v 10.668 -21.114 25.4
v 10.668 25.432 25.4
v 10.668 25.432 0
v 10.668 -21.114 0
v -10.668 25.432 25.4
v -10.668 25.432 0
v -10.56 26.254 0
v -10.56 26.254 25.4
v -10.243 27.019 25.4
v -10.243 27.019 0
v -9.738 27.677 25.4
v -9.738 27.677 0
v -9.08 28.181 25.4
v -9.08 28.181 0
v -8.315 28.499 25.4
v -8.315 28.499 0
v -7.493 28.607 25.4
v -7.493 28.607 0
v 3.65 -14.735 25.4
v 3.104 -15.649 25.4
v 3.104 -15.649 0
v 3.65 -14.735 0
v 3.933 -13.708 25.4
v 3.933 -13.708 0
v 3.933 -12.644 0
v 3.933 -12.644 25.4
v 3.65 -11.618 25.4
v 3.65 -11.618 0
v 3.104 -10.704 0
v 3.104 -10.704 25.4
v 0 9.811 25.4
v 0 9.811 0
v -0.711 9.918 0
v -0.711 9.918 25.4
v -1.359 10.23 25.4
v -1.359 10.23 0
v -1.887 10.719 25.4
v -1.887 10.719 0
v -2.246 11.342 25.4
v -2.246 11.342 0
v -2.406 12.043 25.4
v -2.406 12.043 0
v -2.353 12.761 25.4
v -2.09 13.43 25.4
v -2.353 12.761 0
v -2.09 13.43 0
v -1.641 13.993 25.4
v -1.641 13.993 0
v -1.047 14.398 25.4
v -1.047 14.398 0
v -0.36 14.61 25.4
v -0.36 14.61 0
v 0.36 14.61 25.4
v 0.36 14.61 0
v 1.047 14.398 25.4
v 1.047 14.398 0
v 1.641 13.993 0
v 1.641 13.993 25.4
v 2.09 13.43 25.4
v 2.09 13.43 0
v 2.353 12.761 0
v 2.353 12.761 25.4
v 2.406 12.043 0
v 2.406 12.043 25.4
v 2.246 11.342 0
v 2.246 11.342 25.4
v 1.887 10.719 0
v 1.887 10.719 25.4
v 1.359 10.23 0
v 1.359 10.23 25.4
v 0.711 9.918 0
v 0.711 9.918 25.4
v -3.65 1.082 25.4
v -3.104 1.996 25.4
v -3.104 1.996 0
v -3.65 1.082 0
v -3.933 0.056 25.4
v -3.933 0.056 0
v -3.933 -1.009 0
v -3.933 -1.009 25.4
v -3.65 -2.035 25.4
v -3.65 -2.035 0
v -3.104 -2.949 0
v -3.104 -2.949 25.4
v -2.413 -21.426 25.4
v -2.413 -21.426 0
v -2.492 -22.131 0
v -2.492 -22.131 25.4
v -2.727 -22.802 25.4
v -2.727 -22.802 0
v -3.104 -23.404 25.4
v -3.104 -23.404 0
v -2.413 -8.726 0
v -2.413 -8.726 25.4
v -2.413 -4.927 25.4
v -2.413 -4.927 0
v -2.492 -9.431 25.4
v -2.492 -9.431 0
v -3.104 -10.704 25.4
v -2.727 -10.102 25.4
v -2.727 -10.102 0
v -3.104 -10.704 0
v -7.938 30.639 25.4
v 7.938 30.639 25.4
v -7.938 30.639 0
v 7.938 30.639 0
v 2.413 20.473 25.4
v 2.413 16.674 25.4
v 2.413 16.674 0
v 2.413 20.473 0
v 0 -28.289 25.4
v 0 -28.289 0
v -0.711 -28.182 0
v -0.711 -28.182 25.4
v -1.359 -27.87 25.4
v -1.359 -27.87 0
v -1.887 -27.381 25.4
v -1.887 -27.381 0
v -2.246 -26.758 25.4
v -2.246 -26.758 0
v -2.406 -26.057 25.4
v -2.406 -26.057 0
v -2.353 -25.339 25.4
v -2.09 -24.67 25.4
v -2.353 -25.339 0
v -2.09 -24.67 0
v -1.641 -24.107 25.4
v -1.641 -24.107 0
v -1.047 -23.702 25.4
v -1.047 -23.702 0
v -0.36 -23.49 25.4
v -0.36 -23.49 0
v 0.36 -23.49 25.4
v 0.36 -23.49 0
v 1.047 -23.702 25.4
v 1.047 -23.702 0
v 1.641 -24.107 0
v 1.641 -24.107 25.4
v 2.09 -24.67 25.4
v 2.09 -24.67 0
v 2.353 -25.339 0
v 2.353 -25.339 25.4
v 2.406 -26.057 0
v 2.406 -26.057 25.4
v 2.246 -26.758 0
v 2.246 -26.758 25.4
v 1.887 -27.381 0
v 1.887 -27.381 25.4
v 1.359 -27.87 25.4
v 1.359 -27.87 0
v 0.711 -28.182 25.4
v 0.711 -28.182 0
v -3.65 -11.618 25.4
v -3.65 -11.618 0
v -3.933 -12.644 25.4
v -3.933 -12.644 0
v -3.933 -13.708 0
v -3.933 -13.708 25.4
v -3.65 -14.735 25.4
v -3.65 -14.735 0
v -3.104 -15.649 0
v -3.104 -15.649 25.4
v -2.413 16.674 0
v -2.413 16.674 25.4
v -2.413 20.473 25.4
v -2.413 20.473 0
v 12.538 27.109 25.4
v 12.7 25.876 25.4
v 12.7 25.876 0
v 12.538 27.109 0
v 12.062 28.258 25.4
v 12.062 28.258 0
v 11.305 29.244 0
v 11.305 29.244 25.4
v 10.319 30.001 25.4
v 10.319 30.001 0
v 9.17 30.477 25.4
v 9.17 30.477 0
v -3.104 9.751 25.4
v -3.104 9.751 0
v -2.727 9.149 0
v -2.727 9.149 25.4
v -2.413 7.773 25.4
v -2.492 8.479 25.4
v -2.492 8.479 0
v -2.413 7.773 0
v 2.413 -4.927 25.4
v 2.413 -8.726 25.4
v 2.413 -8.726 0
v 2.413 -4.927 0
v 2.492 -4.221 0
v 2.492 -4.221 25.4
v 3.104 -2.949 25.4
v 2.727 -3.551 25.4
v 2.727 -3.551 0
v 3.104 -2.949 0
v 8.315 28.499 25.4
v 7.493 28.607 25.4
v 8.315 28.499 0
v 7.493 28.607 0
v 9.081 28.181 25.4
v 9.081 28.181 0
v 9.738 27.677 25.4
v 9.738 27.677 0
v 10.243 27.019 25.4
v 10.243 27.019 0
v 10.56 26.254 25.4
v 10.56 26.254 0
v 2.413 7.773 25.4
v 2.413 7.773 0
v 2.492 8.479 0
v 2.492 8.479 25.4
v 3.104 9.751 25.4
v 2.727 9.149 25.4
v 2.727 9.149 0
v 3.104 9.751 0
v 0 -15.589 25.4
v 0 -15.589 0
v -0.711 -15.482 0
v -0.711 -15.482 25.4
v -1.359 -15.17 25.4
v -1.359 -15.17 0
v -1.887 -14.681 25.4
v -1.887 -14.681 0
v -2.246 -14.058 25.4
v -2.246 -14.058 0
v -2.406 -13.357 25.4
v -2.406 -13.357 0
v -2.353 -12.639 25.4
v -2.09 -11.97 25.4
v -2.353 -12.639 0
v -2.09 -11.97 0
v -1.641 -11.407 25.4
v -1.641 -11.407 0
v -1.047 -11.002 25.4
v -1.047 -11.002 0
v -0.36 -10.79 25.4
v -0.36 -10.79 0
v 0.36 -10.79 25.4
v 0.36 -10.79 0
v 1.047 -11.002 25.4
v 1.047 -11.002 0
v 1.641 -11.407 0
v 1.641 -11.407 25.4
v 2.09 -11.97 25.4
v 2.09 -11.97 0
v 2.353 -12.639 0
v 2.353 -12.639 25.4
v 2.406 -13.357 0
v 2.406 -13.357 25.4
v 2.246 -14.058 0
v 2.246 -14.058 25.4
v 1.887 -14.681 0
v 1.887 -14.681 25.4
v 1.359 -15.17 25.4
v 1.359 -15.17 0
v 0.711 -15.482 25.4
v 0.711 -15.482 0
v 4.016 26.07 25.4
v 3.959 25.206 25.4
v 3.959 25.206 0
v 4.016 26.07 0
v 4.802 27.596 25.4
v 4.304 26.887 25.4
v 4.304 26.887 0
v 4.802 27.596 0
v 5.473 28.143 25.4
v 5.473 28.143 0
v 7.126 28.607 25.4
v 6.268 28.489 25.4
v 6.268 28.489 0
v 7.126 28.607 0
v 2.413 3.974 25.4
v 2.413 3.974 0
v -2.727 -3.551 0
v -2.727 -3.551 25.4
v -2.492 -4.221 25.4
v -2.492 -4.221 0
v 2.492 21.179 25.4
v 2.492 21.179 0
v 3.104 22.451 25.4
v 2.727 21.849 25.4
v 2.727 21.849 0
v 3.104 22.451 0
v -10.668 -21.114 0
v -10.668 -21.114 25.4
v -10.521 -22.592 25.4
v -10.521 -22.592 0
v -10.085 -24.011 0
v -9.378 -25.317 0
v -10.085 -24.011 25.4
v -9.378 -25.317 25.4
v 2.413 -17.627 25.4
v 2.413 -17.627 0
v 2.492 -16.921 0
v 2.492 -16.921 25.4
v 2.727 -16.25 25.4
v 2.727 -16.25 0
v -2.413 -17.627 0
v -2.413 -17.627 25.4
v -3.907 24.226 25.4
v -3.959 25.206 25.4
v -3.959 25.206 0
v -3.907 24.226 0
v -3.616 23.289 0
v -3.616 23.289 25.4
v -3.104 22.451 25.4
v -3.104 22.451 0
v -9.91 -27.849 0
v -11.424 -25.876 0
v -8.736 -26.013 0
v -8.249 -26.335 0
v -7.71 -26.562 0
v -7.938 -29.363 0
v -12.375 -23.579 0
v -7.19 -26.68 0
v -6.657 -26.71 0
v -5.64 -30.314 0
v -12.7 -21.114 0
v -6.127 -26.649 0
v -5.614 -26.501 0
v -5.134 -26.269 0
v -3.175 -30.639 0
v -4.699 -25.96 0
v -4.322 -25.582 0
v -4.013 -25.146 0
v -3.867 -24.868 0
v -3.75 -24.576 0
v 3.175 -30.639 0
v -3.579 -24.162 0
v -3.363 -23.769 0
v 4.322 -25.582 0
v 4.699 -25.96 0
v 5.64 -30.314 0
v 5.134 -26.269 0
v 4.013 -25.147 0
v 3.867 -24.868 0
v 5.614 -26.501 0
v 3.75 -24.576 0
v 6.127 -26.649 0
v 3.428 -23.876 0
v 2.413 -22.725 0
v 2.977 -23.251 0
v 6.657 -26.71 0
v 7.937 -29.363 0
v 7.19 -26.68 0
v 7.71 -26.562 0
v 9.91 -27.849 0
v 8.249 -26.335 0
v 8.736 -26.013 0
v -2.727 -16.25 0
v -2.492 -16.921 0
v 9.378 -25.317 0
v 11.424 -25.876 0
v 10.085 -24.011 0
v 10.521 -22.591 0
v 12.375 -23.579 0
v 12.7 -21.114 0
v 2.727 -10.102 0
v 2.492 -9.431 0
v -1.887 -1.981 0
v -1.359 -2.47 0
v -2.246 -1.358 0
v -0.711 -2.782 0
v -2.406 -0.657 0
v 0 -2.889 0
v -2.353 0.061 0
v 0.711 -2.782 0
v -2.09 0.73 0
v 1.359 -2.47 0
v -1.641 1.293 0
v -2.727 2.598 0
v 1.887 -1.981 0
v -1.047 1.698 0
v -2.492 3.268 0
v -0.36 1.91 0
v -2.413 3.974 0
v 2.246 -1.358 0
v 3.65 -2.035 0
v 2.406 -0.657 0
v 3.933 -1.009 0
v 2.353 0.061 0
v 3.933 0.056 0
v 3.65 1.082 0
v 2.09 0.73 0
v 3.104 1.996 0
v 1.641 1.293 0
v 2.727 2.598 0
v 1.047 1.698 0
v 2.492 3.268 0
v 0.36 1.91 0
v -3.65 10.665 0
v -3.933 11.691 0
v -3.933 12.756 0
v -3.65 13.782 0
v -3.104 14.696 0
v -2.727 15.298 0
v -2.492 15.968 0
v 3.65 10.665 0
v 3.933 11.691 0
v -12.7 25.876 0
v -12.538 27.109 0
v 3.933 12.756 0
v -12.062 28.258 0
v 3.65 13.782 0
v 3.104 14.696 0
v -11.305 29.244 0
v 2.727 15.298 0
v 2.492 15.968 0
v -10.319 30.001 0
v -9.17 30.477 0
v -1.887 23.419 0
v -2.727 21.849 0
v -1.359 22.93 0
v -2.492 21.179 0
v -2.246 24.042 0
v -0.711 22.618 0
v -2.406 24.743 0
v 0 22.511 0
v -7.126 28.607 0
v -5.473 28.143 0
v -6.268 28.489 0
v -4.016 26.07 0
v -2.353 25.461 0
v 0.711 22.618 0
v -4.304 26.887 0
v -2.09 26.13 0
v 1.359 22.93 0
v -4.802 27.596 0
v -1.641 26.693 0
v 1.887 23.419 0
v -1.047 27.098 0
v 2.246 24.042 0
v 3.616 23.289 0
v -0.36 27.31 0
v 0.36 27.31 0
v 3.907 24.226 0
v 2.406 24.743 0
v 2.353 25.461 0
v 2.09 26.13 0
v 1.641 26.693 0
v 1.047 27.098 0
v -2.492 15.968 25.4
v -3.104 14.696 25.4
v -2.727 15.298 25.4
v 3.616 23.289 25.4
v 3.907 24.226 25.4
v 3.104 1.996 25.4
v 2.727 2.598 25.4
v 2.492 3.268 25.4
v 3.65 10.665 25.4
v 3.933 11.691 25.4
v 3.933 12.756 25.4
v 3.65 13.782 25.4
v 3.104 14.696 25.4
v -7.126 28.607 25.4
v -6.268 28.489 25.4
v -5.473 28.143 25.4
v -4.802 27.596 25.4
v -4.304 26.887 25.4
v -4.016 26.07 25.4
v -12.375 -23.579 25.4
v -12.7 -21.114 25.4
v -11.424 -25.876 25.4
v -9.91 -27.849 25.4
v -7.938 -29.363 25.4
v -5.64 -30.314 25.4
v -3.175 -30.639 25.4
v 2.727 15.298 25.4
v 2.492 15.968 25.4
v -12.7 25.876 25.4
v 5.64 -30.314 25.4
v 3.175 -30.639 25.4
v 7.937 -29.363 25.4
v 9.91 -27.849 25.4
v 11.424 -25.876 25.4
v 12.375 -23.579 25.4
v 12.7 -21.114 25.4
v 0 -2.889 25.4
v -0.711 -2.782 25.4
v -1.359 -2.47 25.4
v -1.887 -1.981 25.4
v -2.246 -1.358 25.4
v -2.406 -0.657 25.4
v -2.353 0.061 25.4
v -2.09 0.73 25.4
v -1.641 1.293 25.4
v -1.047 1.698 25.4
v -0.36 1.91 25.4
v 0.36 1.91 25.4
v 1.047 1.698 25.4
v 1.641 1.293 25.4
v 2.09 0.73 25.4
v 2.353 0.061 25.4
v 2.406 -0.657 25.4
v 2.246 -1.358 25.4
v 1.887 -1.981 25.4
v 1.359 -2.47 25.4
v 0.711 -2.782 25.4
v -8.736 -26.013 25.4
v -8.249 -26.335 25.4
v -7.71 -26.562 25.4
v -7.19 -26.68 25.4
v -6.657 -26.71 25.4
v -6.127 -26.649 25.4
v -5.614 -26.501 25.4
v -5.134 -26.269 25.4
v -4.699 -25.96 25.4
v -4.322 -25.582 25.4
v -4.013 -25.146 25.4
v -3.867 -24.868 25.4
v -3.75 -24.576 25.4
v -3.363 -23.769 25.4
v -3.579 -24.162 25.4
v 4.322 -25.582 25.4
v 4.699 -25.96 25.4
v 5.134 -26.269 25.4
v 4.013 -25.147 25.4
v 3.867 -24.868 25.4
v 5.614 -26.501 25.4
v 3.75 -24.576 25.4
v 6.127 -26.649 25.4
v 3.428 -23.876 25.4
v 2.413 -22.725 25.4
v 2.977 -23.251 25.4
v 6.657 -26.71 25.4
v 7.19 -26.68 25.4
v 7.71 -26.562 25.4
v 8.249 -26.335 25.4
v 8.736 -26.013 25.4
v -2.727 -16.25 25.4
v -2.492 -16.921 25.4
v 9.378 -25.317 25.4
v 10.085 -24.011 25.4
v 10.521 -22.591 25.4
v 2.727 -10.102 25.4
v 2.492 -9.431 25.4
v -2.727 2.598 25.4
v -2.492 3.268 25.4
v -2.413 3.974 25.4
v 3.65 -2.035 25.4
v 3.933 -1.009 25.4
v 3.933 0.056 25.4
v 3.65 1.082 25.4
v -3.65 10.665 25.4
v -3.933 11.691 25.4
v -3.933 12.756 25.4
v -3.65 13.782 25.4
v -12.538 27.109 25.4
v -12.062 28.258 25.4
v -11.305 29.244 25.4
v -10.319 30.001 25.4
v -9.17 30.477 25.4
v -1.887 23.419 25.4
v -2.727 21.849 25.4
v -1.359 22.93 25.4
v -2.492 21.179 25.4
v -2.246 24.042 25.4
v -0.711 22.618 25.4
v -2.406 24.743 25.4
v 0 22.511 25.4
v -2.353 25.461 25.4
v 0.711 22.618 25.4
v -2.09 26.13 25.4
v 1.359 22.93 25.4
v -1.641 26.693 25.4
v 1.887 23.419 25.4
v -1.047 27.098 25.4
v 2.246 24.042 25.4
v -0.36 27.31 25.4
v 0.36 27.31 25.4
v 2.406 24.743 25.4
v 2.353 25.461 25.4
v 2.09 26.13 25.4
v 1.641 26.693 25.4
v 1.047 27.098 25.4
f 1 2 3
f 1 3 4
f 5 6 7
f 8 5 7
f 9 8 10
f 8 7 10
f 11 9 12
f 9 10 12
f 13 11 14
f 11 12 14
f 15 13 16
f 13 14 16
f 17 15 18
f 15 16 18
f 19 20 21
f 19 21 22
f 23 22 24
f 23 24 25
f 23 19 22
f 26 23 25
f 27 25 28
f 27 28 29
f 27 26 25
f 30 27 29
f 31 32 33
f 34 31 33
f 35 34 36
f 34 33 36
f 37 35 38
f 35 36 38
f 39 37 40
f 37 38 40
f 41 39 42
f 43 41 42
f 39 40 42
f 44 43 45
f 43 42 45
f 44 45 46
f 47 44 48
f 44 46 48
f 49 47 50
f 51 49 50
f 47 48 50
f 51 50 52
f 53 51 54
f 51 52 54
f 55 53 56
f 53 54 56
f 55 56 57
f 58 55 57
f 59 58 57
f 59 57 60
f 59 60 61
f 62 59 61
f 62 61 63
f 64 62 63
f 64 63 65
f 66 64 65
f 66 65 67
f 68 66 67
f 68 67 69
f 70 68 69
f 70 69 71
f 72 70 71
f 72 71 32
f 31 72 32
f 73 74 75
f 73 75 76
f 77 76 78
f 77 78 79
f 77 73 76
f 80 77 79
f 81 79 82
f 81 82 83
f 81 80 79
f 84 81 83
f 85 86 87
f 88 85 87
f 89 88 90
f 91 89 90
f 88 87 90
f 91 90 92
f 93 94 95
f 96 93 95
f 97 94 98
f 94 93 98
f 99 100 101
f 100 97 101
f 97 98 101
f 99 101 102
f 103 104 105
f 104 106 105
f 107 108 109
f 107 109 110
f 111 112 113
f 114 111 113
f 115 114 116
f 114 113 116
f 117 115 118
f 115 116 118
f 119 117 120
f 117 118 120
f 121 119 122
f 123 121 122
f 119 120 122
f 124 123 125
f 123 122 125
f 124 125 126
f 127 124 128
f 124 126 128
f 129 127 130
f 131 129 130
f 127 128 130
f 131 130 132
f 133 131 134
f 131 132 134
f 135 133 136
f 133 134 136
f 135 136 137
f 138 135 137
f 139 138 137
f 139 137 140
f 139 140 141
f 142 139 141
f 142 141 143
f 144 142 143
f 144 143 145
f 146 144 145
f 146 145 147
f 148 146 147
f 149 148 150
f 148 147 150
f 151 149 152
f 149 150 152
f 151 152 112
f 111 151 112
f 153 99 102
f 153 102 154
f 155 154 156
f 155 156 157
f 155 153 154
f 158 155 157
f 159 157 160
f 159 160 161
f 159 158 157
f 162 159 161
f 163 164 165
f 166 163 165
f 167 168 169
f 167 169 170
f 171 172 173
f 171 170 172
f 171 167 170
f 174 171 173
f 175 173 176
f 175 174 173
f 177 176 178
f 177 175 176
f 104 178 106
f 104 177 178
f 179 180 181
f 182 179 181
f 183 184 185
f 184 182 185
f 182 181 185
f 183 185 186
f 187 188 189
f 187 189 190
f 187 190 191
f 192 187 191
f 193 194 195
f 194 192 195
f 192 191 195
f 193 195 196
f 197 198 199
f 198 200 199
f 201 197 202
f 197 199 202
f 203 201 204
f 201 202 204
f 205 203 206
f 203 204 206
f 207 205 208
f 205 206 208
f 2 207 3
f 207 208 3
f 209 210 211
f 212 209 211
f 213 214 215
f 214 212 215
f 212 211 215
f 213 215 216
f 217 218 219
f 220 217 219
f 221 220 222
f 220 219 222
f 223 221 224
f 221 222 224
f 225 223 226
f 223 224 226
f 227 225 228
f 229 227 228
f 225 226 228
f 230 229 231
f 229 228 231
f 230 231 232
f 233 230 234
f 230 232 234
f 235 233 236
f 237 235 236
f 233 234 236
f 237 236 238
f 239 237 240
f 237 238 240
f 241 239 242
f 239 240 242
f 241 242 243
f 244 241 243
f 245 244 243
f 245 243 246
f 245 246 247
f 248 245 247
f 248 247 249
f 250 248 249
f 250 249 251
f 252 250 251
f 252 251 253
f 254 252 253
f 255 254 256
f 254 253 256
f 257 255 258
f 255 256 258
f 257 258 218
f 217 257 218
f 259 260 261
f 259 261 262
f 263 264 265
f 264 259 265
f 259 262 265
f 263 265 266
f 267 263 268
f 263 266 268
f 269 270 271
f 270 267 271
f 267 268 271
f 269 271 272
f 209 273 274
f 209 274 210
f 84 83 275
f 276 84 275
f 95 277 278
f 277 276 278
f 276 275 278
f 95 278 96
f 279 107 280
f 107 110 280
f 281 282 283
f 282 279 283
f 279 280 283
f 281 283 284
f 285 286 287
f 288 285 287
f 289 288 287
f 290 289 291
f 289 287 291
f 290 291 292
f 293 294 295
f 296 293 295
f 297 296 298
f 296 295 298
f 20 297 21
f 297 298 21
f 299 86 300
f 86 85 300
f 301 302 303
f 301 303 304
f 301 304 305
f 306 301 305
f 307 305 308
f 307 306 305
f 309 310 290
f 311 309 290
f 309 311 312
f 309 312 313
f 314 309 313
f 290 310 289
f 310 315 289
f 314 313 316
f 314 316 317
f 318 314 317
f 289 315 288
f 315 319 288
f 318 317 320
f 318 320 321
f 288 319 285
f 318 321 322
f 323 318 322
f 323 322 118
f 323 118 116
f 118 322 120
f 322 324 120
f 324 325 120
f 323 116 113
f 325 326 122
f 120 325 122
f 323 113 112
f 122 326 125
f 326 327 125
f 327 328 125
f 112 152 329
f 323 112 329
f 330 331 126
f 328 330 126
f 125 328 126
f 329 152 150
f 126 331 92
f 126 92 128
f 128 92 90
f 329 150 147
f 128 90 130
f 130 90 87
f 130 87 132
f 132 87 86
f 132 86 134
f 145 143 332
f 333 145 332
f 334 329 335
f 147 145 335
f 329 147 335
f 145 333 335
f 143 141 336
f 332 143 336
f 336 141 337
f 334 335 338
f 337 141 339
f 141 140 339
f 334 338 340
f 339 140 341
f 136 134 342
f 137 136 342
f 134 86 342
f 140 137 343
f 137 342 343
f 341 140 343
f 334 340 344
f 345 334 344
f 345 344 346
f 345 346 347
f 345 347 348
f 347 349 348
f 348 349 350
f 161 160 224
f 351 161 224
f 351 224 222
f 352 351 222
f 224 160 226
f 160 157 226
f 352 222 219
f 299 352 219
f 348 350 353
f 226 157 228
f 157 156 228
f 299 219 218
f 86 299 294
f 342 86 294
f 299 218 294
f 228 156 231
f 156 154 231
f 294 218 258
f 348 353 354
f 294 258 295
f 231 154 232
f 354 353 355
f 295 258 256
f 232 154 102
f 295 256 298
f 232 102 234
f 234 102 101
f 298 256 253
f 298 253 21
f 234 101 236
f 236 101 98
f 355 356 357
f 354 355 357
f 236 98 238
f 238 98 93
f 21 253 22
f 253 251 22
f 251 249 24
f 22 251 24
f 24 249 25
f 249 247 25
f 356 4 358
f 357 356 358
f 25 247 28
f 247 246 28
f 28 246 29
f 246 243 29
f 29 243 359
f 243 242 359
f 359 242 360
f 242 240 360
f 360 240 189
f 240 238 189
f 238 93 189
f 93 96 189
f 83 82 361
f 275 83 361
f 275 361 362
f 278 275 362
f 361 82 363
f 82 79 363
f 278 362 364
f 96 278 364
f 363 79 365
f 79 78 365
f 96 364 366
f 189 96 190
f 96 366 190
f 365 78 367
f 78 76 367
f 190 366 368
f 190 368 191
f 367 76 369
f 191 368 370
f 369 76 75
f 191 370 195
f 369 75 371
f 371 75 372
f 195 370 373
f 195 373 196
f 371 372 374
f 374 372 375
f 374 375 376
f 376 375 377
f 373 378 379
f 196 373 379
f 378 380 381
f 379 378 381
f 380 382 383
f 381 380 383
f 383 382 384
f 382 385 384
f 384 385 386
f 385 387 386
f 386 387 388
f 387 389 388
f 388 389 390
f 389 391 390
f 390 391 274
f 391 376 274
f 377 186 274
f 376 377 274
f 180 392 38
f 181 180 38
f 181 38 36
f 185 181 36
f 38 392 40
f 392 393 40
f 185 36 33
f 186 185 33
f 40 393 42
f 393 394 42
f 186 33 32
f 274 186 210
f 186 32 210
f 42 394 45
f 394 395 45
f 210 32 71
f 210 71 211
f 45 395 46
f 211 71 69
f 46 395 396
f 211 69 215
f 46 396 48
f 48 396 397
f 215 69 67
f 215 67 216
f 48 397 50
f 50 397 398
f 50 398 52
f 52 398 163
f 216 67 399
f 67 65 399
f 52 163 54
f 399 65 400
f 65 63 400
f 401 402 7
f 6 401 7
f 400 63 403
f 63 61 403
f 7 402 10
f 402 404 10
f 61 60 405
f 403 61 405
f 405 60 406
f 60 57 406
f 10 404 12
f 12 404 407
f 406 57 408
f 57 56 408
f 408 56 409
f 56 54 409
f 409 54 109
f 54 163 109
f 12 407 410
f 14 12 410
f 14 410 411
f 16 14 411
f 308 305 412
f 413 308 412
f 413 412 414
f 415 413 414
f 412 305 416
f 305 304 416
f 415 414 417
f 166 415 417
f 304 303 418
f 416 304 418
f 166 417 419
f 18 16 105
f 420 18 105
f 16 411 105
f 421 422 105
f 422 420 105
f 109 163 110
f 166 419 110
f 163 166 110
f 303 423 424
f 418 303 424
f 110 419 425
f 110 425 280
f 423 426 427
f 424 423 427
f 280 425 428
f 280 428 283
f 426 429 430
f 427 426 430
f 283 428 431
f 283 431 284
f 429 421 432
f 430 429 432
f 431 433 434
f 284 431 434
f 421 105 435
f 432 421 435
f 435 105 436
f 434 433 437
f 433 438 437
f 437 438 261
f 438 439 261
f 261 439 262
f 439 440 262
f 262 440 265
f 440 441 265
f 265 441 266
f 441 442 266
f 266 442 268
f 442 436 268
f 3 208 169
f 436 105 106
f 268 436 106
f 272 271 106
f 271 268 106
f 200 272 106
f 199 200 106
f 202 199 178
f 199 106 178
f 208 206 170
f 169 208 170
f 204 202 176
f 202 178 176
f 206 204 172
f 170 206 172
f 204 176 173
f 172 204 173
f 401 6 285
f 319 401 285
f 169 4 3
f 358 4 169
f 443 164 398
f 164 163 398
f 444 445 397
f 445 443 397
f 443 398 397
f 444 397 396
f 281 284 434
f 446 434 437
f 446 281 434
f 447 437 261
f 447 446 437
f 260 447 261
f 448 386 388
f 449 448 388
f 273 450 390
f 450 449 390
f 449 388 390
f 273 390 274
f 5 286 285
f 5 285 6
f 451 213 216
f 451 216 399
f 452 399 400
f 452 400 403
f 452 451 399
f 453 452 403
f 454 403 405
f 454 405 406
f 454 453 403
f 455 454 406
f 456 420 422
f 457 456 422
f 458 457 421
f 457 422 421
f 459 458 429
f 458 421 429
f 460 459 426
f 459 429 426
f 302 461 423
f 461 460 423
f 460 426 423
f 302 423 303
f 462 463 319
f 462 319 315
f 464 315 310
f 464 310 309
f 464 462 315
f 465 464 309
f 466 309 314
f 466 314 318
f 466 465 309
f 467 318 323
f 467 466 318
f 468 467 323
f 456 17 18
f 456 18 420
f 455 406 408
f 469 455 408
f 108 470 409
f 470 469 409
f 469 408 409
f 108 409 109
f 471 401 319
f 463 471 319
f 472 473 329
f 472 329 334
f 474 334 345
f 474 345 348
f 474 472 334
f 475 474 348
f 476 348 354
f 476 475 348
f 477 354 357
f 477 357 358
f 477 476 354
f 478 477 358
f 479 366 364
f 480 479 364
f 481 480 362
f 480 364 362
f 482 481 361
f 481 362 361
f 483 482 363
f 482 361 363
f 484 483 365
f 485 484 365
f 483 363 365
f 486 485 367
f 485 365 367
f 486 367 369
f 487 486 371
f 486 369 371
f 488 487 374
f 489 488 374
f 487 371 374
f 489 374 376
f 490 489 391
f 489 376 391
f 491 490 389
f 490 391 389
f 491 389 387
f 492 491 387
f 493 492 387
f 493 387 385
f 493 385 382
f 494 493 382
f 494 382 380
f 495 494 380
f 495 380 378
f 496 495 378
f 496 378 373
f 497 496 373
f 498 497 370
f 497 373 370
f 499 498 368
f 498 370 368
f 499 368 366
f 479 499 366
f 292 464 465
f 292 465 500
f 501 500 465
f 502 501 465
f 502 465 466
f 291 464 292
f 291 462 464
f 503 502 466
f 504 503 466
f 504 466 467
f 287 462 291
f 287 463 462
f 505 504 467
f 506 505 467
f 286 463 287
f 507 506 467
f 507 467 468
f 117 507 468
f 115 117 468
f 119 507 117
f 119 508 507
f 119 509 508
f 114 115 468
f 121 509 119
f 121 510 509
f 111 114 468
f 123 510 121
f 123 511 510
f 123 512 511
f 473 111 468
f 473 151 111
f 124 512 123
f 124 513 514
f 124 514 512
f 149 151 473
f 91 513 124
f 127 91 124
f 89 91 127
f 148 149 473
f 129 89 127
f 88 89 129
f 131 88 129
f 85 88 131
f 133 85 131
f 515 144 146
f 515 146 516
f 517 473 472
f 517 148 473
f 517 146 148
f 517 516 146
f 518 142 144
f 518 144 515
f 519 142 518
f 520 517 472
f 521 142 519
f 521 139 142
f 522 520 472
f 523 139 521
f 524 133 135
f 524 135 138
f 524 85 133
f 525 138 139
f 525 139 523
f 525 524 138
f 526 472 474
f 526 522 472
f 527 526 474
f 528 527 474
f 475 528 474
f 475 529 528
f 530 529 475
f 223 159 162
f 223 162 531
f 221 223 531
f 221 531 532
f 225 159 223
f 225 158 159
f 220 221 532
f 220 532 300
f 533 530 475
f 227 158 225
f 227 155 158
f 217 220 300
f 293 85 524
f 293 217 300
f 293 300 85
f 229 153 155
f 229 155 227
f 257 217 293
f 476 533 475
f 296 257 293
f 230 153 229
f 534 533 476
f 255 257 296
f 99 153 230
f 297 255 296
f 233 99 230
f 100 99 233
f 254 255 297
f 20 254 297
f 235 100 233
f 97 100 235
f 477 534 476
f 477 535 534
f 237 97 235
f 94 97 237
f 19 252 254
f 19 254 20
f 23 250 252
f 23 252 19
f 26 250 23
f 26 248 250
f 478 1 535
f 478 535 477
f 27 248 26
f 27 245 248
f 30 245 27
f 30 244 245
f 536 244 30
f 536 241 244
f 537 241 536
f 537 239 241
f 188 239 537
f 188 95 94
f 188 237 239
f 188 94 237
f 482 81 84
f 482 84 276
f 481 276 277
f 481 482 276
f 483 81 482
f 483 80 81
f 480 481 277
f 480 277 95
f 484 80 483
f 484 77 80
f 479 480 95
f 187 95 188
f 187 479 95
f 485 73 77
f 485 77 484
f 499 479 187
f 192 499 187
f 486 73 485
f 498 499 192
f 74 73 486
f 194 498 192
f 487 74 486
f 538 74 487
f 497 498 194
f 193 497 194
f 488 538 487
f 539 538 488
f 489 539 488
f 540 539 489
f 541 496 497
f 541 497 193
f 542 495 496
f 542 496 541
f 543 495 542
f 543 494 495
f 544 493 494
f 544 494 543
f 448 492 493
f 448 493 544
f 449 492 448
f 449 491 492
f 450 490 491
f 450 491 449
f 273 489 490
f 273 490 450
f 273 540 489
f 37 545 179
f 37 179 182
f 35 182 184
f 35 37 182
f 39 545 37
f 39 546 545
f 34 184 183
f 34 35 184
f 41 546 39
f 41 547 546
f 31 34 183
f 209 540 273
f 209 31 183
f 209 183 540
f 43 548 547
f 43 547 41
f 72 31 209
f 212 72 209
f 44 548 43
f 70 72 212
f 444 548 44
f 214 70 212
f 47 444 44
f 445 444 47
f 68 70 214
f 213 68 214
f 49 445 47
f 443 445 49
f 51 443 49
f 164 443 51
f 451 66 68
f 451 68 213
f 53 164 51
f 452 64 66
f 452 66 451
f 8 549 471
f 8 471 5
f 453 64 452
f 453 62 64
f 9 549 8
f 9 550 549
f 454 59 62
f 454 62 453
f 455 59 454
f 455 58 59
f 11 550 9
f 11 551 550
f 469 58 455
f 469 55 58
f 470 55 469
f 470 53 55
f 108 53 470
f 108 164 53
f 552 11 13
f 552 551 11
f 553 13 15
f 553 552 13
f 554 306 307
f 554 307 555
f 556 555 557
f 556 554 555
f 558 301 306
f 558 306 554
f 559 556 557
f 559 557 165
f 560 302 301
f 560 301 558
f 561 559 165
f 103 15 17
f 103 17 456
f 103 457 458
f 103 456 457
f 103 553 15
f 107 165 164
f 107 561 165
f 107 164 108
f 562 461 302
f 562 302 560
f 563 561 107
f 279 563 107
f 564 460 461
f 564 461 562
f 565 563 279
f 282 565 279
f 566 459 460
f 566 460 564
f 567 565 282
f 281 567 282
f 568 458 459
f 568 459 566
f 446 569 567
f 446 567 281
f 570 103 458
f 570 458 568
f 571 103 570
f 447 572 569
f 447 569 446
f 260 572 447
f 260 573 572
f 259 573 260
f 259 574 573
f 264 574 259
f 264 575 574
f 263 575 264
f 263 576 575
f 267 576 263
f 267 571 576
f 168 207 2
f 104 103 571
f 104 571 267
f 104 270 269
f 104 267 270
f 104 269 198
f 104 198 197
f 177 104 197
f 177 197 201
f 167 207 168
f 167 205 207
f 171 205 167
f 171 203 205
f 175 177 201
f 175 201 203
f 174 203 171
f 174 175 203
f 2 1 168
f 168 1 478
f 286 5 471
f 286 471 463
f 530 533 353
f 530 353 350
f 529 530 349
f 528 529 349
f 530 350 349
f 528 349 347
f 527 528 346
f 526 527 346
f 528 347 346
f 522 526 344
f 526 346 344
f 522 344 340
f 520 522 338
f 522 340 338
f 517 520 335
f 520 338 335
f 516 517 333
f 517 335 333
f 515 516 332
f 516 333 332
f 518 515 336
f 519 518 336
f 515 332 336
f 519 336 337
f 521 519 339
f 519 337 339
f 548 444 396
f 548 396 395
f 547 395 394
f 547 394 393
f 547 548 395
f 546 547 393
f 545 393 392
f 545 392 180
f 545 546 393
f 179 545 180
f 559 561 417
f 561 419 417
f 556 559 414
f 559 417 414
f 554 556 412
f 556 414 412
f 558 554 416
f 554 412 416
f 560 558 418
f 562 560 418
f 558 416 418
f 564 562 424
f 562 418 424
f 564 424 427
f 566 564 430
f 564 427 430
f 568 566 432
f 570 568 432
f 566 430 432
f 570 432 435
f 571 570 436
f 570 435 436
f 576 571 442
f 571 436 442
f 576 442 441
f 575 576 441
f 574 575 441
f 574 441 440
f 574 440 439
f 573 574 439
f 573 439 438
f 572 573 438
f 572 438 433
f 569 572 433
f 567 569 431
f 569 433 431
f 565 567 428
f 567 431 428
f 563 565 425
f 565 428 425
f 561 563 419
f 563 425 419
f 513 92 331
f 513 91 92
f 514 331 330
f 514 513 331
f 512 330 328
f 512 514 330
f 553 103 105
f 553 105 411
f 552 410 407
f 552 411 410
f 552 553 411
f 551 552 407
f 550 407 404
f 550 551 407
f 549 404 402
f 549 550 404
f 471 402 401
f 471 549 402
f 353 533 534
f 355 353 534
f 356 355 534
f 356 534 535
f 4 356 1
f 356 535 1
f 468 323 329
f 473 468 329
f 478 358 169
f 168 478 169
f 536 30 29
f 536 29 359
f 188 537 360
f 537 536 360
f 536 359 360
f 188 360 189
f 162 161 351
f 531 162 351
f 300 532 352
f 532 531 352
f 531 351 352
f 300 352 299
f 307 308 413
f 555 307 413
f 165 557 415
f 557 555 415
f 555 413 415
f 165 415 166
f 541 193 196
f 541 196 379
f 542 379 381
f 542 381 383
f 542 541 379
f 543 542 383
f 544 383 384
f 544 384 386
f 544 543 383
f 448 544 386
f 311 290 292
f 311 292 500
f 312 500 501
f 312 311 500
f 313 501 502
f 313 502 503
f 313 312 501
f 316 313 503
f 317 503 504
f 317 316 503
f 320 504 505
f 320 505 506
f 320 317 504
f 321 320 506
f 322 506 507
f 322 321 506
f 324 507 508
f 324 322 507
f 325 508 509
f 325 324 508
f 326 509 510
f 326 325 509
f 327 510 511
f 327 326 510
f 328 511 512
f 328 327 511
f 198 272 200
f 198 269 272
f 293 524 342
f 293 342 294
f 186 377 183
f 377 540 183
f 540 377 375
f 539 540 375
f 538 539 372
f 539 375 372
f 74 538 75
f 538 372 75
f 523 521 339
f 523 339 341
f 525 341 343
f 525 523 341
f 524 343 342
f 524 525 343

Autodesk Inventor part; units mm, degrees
ref_plane "YZ Plane" through (0, 0, 0) normal (1, 0, 0) x (0, 1, 0)
ref_plane "XZ Plane" through (0, 0, 0) normal (0, 1, 0) x (-1, 0, 0)
ref_plane "XY Plane" through (0, 0, 0) normal (0, 0, 1) x (1, 0, 0)
sketch "Sketch2" plane through (0, 0, 0) normal (0, 0, 1) x (1, 0, 0)
  line L0 (-12.7, -30.6388) -> (12.7, -30.6388)
  line L1 (12.7, -30.6388) -> (12.7, 30.6388)
  line L2 (12.7, 30.6388) -> (-12.7, 30.6388)
  line L3 (-12.7, 30.6388) -> (-12.7, -30.6388)
  line L4 (-12.7, -30.6388) -> (12.7, 30.6388) construction
  line L5 (12.7, -30.6388) -> (-12.7, 30.6388) construction
  line L6 (0, 30.6388) -> (0, -30.6388) construction
  point P0 (0, 0)
  dimension "d0" = 25.4
  dimension "d1" = 61.2775
extrude "Extrusion1" add sketch "Sketch2" along normal blind 25.4
sketch "Sketch3" plane through (0, 0, 25.4) normal (0, 0, 1) x (1, 0, 0)
  line L0 (-12.7, -30.6388) -> (12.7, -30.6388) construction
  point P0 (0, 0)
  point P1 (0, -25.8762)
  dimension "d5" = 4.7625
hole "Hole1" at (0, -25.8762, 25.4) direction (0, 0, -1) diameter 4.826 end through all clearance for "Flat Head Machine Screw (82)" size "#10" standard "Ansi Unified Screw Threads"
fillet "Fillet1" radius 9.525 2 edges at (-12.7, -30.6388, 12.7) (12.7, -30.6388, 12.7)
pattern_linear "Rectangular Pattern1" count 5 spacing 12.7 along (0, 1, 0) of "Hole1"
sketch "Sketch4" plane through (0, 0, 25.4) normal (0, 0, 1) x (1, 0, 0)
  circle A0 centre (0, 24.9237) radius 2.413 projected
  circle A1 centre (0, 12.2237) radius 2.413 projected
  circle A2 centre (0, -0.4763) radius 2.413 projected
  circle A3 centre (0, -13.1762) radius 2.413 projected
  arc A4 (3.175, -30.6388) -> (12.7, -21.1137) centre (3.175, -21.1137) ccw projected
  line L0 (12.7, -21.1137) -> (12.7, 30.6388) projected
  line L1 (12.7, 30.6388) -> (-12.7, 30.6388) projected
  line L2 (-12.7, 30.6388) -> (-12.7, -21.1138) projected
  arc A5 (-12.7, -21.1138) -> (-3.175, -30.6388) centre (-3.175, -21.1138) ccw projected
  line L3 (-3.175, -30.6388) -> (3.175, -30.6388) projected
  circle A6 centre (0, -25.8762) radius 2.413 projected
  circle A7 centre (0, -25.8762) radius 3.9688
  circle A8 centre (0, -13.1762) radius 3.9688
  circle A9 centre (0, -0.4763) radius 3.9688
  circle A10 centre (0, 12.2237) radius 3.9688
  circle A11 centre (0, 24.9237) radius 3.9688
  line L4 (2.413, -22.7253) -> (2.413, -16.3272)
  line L5 (2.413, -10.0253) -> (2.413, -3.6272)
  line L6 (-2.413, -22.7253) -> (-2.413, -16.3272)
  line L7 (-2.413, -10.0253) -> (-2.413, -3.6272)
  line L8 (2.413, 2.6747) -> (2.413, 9.0728)
  line L9 (-2.413, 2.6747) -> (-2.413, 9.0728)
  line L10 (-2.413, 15.3747) -> (-2.413, 21.7728)
  line L11 (2.413, 15.3747) -> (2.413, 21.7728)
  arc A12 (-10.668, -21.1138) -> (-3.175, -28.6068) centre (-3.175, -21.1138) ccw
  line L12 (-10.668, -21.1138) -> (-10.668, 28.6068)
  line L13 (-10.668, 28.6068) -> (10.668, 28.6068)
  line L14 (10.668, 28.6068) -> (10.668, -21.1137)
  arc A13 (3.175, -28.6068) -> (10.668, -21.1137) centre (3.175, -21.1137) ccw
  line L15 (3.175, -28.6068) -> (-3.175, -28.6068)
  point P0 (0, 0)
  point P1 (1.4787, 28.6068)
  point P2 (2.8802, -28.6068)
  point P3 (-2.8802, -28.6068)
  point P4 (-1.4787, 28.6068)
  dimension "d16" = 7.9375
  dimension "d17" = 2.032
extrude "Extrusion2" cut sketch "Sketch4" against normal through all contours A7 L4 A8 L5 A9 L8 A10 L11 A11 L13 L14 A13 L15 | A7 L15 A12 L12 L13 A11 L10 A10 L9 A9 L7 A8 L6
fillet "Fillet2" radius 3.175 21 edges at (2.8802, -28.6068, 12.7) (-2.8802, -28.6068, 12.7) (-1.4787, 28.6068, 12.7) (1.4787, 28.6068, 12.7) (-10.668, 28.6068, 12.7) (10.668, 28.6068, 12.7) (2.413, -16.3272, 12.7) (2.413, -10.0253, 12.7) (2.413, -3.6272, 12.7) (2.413, 2.6747, 12.7) (2.413, 9.0728, 12.7) (2.413, 15.3747, 12.7) (2.413, 21.7728, 12.7) (-2.413, -16.3272, 12.7) (-2.413, -10.0253, 12.7) (-2.413, -3.6272, 12.7) (-2.413, 2.6747, 12.7) (-2.413, 9.0728, 12.7) (-2.413, 15.3747, 12.7) (-2.413, 21.7728, 12.7) (-2.413, -22.7253, 12.7)
fillet "Fillet3" radius 4.7625 2 edges at (12.7, 30.6388, 12.7) (-12.7, 30.6388, 12.7)
properties part number "SDS LOWERING SPACER" material "Aluminum 7075"
